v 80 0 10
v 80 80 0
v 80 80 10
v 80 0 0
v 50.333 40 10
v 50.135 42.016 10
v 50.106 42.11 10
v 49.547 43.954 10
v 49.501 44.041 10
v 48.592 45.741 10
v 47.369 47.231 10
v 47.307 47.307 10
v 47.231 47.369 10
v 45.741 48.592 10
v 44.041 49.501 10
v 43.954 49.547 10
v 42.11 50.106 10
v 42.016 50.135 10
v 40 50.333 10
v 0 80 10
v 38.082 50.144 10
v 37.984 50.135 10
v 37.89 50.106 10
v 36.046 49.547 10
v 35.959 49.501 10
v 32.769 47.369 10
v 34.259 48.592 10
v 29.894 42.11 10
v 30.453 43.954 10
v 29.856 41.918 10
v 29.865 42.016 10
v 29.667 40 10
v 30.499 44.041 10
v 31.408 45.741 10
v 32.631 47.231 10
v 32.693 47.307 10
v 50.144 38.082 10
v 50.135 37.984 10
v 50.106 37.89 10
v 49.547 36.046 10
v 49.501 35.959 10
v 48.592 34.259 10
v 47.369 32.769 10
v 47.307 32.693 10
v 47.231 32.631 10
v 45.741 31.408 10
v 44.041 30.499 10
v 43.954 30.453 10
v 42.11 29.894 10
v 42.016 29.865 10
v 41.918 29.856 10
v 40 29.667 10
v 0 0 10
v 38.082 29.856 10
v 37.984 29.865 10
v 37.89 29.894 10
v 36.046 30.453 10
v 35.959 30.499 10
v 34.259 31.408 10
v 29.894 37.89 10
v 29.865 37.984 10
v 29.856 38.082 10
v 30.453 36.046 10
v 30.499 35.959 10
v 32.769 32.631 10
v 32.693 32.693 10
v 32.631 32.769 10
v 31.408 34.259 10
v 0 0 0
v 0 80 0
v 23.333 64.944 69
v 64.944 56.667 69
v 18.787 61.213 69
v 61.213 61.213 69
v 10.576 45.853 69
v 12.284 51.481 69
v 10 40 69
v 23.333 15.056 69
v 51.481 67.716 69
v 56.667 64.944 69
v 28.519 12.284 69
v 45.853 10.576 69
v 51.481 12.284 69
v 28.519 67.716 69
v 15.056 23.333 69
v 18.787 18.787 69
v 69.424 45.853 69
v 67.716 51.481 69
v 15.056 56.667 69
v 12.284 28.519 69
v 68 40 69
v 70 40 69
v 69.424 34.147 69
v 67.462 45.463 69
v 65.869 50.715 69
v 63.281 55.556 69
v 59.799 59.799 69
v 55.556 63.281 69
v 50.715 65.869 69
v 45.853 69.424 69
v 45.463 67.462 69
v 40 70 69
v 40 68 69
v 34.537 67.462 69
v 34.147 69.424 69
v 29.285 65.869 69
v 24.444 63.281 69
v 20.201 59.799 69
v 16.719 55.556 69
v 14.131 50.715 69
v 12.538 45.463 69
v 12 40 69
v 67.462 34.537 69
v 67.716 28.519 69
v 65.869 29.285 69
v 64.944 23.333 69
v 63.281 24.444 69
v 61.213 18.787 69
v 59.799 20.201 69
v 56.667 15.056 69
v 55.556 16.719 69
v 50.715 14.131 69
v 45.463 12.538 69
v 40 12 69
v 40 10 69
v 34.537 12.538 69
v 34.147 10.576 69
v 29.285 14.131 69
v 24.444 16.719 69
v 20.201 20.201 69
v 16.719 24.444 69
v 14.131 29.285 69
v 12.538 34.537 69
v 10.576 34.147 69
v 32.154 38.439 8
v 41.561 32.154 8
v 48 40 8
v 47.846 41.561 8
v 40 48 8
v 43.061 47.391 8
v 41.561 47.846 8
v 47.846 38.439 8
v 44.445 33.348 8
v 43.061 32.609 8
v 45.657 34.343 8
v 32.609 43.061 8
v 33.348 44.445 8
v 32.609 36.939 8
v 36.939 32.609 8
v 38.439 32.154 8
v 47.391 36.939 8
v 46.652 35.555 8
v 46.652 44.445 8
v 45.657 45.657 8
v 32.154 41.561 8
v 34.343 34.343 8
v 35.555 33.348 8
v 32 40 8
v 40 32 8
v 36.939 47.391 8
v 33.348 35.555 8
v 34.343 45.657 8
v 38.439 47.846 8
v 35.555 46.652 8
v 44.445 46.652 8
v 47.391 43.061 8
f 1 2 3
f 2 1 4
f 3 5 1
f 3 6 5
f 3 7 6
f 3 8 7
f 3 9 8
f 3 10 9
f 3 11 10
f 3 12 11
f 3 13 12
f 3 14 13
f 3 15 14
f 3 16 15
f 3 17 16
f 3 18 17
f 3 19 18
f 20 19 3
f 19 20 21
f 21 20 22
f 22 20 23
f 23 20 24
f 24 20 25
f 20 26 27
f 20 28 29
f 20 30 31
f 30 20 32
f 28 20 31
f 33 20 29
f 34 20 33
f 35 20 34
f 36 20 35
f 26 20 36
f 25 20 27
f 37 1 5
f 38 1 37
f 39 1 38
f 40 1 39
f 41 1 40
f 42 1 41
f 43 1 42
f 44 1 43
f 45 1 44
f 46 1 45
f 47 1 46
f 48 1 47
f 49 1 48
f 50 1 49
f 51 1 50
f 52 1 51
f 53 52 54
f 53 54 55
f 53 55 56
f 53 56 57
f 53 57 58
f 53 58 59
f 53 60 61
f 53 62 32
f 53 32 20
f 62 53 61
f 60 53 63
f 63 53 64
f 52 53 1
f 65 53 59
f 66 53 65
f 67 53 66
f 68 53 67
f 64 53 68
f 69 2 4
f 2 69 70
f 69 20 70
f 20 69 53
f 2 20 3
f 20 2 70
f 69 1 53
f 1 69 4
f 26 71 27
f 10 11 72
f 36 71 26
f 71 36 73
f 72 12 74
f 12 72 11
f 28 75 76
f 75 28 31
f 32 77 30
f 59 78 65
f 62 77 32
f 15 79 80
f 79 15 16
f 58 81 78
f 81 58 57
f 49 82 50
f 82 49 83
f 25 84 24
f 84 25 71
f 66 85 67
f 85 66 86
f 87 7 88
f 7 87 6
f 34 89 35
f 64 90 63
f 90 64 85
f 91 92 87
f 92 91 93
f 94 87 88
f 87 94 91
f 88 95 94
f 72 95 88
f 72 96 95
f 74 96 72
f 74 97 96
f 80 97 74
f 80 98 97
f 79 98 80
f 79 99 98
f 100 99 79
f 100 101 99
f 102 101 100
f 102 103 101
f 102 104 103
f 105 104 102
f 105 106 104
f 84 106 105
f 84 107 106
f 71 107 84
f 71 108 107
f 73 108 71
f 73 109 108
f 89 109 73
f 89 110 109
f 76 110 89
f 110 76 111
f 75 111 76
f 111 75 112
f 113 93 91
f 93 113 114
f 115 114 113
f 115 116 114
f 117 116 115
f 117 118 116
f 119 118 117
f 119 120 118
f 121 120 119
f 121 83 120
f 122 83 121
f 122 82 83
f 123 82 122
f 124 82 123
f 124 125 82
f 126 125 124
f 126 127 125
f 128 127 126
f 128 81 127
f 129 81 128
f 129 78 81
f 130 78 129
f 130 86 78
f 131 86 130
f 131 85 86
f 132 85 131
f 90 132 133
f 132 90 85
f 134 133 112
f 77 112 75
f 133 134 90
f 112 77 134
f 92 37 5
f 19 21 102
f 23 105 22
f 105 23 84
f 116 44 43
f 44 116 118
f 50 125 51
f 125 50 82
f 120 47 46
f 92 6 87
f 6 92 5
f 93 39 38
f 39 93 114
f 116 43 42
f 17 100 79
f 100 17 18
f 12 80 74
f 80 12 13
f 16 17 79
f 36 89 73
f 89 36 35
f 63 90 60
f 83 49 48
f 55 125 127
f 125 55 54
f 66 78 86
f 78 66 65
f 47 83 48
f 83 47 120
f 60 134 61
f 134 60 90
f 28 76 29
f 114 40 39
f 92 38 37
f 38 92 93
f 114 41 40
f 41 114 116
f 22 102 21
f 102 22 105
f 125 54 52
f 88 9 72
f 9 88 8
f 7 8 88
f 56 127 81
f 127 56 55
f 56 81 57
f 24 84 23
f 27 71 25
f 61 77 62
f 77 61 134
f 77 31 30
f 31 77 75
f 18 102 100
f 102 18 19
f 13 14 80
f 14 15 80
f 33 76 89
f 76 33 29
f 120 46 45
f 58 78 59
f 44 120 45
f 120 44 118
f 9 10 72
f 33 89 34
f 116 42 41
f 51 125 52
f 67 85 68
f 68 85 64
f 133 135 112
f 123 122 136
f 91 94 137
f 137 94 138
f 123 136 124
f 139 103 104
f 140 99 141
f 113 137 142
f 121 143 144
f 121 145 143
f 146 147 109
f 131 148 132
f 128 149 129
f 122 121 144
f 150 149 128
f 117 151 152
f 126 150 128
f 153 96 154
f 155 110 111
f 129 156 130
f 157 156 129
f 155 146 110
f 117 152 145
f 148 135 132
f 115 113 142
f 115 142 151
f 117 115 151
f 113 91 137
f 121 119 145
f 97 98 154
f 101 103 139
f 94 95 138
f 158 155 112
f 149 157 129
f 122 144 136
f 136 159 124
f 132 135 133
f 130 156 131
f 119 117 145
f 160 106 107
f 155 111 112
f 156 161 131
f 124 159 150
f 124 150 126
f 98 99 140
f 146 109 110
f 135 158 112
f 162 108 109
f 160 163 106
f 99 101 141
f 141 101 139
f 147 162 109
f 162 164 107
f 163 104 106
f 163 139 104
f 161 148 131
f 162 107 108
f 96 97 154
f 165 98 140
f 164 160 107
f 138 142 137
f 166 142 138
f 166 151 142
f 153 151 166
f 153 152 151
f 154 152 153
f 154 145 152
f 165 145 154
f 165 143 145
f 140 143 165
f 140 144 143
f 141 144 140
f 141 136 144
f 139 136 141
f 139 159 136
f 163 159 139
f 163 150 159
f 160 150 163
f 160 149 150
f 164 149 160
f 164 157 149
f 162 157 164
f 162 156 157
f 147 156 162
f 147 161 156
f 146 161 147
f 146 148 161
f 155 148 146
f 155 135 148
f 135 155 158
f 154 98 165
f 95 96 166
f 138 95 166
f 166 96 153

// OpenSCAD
$fn = 32;

// ----------------------------------------------------------------------
// Hopper: funnel with square flange
// ----------------------------------------------------------------------

// --- parameters (mm) ---
fl = 80;                  // flange side, X and Y
fl_t = 10;                // flange thickness
cone_h = 60;              // cone height above the flange
top_d = 60;               // cone mouth diameter
bot_d = 20;               // cone spout diameter
wall = 2;                 // cone wall thickness
fit_tol = 0.05;           // tolerance for press fits, mm
free_tol = 0.3;           // tolerance for clearance fits, mm

bore_d = bot_d - 2 * wall;  // spout bore diameter
total_h = fl_t + cone_h - 1;  // overall height

difference() {
  union() {
    cube([fl, fl, fl_t]);
    translate([fl / 2, fl / 2, fl_t - 1])
      cylinder(h = cone_h, d1 = bot_d, d2 = top_d);
  }
  translate([fl / 2, fl / 2, fl_t - 2])
    cylinder(h = cone_h + 1, d1 = bore_d, d2 = top_d - 2 * wall);
}
